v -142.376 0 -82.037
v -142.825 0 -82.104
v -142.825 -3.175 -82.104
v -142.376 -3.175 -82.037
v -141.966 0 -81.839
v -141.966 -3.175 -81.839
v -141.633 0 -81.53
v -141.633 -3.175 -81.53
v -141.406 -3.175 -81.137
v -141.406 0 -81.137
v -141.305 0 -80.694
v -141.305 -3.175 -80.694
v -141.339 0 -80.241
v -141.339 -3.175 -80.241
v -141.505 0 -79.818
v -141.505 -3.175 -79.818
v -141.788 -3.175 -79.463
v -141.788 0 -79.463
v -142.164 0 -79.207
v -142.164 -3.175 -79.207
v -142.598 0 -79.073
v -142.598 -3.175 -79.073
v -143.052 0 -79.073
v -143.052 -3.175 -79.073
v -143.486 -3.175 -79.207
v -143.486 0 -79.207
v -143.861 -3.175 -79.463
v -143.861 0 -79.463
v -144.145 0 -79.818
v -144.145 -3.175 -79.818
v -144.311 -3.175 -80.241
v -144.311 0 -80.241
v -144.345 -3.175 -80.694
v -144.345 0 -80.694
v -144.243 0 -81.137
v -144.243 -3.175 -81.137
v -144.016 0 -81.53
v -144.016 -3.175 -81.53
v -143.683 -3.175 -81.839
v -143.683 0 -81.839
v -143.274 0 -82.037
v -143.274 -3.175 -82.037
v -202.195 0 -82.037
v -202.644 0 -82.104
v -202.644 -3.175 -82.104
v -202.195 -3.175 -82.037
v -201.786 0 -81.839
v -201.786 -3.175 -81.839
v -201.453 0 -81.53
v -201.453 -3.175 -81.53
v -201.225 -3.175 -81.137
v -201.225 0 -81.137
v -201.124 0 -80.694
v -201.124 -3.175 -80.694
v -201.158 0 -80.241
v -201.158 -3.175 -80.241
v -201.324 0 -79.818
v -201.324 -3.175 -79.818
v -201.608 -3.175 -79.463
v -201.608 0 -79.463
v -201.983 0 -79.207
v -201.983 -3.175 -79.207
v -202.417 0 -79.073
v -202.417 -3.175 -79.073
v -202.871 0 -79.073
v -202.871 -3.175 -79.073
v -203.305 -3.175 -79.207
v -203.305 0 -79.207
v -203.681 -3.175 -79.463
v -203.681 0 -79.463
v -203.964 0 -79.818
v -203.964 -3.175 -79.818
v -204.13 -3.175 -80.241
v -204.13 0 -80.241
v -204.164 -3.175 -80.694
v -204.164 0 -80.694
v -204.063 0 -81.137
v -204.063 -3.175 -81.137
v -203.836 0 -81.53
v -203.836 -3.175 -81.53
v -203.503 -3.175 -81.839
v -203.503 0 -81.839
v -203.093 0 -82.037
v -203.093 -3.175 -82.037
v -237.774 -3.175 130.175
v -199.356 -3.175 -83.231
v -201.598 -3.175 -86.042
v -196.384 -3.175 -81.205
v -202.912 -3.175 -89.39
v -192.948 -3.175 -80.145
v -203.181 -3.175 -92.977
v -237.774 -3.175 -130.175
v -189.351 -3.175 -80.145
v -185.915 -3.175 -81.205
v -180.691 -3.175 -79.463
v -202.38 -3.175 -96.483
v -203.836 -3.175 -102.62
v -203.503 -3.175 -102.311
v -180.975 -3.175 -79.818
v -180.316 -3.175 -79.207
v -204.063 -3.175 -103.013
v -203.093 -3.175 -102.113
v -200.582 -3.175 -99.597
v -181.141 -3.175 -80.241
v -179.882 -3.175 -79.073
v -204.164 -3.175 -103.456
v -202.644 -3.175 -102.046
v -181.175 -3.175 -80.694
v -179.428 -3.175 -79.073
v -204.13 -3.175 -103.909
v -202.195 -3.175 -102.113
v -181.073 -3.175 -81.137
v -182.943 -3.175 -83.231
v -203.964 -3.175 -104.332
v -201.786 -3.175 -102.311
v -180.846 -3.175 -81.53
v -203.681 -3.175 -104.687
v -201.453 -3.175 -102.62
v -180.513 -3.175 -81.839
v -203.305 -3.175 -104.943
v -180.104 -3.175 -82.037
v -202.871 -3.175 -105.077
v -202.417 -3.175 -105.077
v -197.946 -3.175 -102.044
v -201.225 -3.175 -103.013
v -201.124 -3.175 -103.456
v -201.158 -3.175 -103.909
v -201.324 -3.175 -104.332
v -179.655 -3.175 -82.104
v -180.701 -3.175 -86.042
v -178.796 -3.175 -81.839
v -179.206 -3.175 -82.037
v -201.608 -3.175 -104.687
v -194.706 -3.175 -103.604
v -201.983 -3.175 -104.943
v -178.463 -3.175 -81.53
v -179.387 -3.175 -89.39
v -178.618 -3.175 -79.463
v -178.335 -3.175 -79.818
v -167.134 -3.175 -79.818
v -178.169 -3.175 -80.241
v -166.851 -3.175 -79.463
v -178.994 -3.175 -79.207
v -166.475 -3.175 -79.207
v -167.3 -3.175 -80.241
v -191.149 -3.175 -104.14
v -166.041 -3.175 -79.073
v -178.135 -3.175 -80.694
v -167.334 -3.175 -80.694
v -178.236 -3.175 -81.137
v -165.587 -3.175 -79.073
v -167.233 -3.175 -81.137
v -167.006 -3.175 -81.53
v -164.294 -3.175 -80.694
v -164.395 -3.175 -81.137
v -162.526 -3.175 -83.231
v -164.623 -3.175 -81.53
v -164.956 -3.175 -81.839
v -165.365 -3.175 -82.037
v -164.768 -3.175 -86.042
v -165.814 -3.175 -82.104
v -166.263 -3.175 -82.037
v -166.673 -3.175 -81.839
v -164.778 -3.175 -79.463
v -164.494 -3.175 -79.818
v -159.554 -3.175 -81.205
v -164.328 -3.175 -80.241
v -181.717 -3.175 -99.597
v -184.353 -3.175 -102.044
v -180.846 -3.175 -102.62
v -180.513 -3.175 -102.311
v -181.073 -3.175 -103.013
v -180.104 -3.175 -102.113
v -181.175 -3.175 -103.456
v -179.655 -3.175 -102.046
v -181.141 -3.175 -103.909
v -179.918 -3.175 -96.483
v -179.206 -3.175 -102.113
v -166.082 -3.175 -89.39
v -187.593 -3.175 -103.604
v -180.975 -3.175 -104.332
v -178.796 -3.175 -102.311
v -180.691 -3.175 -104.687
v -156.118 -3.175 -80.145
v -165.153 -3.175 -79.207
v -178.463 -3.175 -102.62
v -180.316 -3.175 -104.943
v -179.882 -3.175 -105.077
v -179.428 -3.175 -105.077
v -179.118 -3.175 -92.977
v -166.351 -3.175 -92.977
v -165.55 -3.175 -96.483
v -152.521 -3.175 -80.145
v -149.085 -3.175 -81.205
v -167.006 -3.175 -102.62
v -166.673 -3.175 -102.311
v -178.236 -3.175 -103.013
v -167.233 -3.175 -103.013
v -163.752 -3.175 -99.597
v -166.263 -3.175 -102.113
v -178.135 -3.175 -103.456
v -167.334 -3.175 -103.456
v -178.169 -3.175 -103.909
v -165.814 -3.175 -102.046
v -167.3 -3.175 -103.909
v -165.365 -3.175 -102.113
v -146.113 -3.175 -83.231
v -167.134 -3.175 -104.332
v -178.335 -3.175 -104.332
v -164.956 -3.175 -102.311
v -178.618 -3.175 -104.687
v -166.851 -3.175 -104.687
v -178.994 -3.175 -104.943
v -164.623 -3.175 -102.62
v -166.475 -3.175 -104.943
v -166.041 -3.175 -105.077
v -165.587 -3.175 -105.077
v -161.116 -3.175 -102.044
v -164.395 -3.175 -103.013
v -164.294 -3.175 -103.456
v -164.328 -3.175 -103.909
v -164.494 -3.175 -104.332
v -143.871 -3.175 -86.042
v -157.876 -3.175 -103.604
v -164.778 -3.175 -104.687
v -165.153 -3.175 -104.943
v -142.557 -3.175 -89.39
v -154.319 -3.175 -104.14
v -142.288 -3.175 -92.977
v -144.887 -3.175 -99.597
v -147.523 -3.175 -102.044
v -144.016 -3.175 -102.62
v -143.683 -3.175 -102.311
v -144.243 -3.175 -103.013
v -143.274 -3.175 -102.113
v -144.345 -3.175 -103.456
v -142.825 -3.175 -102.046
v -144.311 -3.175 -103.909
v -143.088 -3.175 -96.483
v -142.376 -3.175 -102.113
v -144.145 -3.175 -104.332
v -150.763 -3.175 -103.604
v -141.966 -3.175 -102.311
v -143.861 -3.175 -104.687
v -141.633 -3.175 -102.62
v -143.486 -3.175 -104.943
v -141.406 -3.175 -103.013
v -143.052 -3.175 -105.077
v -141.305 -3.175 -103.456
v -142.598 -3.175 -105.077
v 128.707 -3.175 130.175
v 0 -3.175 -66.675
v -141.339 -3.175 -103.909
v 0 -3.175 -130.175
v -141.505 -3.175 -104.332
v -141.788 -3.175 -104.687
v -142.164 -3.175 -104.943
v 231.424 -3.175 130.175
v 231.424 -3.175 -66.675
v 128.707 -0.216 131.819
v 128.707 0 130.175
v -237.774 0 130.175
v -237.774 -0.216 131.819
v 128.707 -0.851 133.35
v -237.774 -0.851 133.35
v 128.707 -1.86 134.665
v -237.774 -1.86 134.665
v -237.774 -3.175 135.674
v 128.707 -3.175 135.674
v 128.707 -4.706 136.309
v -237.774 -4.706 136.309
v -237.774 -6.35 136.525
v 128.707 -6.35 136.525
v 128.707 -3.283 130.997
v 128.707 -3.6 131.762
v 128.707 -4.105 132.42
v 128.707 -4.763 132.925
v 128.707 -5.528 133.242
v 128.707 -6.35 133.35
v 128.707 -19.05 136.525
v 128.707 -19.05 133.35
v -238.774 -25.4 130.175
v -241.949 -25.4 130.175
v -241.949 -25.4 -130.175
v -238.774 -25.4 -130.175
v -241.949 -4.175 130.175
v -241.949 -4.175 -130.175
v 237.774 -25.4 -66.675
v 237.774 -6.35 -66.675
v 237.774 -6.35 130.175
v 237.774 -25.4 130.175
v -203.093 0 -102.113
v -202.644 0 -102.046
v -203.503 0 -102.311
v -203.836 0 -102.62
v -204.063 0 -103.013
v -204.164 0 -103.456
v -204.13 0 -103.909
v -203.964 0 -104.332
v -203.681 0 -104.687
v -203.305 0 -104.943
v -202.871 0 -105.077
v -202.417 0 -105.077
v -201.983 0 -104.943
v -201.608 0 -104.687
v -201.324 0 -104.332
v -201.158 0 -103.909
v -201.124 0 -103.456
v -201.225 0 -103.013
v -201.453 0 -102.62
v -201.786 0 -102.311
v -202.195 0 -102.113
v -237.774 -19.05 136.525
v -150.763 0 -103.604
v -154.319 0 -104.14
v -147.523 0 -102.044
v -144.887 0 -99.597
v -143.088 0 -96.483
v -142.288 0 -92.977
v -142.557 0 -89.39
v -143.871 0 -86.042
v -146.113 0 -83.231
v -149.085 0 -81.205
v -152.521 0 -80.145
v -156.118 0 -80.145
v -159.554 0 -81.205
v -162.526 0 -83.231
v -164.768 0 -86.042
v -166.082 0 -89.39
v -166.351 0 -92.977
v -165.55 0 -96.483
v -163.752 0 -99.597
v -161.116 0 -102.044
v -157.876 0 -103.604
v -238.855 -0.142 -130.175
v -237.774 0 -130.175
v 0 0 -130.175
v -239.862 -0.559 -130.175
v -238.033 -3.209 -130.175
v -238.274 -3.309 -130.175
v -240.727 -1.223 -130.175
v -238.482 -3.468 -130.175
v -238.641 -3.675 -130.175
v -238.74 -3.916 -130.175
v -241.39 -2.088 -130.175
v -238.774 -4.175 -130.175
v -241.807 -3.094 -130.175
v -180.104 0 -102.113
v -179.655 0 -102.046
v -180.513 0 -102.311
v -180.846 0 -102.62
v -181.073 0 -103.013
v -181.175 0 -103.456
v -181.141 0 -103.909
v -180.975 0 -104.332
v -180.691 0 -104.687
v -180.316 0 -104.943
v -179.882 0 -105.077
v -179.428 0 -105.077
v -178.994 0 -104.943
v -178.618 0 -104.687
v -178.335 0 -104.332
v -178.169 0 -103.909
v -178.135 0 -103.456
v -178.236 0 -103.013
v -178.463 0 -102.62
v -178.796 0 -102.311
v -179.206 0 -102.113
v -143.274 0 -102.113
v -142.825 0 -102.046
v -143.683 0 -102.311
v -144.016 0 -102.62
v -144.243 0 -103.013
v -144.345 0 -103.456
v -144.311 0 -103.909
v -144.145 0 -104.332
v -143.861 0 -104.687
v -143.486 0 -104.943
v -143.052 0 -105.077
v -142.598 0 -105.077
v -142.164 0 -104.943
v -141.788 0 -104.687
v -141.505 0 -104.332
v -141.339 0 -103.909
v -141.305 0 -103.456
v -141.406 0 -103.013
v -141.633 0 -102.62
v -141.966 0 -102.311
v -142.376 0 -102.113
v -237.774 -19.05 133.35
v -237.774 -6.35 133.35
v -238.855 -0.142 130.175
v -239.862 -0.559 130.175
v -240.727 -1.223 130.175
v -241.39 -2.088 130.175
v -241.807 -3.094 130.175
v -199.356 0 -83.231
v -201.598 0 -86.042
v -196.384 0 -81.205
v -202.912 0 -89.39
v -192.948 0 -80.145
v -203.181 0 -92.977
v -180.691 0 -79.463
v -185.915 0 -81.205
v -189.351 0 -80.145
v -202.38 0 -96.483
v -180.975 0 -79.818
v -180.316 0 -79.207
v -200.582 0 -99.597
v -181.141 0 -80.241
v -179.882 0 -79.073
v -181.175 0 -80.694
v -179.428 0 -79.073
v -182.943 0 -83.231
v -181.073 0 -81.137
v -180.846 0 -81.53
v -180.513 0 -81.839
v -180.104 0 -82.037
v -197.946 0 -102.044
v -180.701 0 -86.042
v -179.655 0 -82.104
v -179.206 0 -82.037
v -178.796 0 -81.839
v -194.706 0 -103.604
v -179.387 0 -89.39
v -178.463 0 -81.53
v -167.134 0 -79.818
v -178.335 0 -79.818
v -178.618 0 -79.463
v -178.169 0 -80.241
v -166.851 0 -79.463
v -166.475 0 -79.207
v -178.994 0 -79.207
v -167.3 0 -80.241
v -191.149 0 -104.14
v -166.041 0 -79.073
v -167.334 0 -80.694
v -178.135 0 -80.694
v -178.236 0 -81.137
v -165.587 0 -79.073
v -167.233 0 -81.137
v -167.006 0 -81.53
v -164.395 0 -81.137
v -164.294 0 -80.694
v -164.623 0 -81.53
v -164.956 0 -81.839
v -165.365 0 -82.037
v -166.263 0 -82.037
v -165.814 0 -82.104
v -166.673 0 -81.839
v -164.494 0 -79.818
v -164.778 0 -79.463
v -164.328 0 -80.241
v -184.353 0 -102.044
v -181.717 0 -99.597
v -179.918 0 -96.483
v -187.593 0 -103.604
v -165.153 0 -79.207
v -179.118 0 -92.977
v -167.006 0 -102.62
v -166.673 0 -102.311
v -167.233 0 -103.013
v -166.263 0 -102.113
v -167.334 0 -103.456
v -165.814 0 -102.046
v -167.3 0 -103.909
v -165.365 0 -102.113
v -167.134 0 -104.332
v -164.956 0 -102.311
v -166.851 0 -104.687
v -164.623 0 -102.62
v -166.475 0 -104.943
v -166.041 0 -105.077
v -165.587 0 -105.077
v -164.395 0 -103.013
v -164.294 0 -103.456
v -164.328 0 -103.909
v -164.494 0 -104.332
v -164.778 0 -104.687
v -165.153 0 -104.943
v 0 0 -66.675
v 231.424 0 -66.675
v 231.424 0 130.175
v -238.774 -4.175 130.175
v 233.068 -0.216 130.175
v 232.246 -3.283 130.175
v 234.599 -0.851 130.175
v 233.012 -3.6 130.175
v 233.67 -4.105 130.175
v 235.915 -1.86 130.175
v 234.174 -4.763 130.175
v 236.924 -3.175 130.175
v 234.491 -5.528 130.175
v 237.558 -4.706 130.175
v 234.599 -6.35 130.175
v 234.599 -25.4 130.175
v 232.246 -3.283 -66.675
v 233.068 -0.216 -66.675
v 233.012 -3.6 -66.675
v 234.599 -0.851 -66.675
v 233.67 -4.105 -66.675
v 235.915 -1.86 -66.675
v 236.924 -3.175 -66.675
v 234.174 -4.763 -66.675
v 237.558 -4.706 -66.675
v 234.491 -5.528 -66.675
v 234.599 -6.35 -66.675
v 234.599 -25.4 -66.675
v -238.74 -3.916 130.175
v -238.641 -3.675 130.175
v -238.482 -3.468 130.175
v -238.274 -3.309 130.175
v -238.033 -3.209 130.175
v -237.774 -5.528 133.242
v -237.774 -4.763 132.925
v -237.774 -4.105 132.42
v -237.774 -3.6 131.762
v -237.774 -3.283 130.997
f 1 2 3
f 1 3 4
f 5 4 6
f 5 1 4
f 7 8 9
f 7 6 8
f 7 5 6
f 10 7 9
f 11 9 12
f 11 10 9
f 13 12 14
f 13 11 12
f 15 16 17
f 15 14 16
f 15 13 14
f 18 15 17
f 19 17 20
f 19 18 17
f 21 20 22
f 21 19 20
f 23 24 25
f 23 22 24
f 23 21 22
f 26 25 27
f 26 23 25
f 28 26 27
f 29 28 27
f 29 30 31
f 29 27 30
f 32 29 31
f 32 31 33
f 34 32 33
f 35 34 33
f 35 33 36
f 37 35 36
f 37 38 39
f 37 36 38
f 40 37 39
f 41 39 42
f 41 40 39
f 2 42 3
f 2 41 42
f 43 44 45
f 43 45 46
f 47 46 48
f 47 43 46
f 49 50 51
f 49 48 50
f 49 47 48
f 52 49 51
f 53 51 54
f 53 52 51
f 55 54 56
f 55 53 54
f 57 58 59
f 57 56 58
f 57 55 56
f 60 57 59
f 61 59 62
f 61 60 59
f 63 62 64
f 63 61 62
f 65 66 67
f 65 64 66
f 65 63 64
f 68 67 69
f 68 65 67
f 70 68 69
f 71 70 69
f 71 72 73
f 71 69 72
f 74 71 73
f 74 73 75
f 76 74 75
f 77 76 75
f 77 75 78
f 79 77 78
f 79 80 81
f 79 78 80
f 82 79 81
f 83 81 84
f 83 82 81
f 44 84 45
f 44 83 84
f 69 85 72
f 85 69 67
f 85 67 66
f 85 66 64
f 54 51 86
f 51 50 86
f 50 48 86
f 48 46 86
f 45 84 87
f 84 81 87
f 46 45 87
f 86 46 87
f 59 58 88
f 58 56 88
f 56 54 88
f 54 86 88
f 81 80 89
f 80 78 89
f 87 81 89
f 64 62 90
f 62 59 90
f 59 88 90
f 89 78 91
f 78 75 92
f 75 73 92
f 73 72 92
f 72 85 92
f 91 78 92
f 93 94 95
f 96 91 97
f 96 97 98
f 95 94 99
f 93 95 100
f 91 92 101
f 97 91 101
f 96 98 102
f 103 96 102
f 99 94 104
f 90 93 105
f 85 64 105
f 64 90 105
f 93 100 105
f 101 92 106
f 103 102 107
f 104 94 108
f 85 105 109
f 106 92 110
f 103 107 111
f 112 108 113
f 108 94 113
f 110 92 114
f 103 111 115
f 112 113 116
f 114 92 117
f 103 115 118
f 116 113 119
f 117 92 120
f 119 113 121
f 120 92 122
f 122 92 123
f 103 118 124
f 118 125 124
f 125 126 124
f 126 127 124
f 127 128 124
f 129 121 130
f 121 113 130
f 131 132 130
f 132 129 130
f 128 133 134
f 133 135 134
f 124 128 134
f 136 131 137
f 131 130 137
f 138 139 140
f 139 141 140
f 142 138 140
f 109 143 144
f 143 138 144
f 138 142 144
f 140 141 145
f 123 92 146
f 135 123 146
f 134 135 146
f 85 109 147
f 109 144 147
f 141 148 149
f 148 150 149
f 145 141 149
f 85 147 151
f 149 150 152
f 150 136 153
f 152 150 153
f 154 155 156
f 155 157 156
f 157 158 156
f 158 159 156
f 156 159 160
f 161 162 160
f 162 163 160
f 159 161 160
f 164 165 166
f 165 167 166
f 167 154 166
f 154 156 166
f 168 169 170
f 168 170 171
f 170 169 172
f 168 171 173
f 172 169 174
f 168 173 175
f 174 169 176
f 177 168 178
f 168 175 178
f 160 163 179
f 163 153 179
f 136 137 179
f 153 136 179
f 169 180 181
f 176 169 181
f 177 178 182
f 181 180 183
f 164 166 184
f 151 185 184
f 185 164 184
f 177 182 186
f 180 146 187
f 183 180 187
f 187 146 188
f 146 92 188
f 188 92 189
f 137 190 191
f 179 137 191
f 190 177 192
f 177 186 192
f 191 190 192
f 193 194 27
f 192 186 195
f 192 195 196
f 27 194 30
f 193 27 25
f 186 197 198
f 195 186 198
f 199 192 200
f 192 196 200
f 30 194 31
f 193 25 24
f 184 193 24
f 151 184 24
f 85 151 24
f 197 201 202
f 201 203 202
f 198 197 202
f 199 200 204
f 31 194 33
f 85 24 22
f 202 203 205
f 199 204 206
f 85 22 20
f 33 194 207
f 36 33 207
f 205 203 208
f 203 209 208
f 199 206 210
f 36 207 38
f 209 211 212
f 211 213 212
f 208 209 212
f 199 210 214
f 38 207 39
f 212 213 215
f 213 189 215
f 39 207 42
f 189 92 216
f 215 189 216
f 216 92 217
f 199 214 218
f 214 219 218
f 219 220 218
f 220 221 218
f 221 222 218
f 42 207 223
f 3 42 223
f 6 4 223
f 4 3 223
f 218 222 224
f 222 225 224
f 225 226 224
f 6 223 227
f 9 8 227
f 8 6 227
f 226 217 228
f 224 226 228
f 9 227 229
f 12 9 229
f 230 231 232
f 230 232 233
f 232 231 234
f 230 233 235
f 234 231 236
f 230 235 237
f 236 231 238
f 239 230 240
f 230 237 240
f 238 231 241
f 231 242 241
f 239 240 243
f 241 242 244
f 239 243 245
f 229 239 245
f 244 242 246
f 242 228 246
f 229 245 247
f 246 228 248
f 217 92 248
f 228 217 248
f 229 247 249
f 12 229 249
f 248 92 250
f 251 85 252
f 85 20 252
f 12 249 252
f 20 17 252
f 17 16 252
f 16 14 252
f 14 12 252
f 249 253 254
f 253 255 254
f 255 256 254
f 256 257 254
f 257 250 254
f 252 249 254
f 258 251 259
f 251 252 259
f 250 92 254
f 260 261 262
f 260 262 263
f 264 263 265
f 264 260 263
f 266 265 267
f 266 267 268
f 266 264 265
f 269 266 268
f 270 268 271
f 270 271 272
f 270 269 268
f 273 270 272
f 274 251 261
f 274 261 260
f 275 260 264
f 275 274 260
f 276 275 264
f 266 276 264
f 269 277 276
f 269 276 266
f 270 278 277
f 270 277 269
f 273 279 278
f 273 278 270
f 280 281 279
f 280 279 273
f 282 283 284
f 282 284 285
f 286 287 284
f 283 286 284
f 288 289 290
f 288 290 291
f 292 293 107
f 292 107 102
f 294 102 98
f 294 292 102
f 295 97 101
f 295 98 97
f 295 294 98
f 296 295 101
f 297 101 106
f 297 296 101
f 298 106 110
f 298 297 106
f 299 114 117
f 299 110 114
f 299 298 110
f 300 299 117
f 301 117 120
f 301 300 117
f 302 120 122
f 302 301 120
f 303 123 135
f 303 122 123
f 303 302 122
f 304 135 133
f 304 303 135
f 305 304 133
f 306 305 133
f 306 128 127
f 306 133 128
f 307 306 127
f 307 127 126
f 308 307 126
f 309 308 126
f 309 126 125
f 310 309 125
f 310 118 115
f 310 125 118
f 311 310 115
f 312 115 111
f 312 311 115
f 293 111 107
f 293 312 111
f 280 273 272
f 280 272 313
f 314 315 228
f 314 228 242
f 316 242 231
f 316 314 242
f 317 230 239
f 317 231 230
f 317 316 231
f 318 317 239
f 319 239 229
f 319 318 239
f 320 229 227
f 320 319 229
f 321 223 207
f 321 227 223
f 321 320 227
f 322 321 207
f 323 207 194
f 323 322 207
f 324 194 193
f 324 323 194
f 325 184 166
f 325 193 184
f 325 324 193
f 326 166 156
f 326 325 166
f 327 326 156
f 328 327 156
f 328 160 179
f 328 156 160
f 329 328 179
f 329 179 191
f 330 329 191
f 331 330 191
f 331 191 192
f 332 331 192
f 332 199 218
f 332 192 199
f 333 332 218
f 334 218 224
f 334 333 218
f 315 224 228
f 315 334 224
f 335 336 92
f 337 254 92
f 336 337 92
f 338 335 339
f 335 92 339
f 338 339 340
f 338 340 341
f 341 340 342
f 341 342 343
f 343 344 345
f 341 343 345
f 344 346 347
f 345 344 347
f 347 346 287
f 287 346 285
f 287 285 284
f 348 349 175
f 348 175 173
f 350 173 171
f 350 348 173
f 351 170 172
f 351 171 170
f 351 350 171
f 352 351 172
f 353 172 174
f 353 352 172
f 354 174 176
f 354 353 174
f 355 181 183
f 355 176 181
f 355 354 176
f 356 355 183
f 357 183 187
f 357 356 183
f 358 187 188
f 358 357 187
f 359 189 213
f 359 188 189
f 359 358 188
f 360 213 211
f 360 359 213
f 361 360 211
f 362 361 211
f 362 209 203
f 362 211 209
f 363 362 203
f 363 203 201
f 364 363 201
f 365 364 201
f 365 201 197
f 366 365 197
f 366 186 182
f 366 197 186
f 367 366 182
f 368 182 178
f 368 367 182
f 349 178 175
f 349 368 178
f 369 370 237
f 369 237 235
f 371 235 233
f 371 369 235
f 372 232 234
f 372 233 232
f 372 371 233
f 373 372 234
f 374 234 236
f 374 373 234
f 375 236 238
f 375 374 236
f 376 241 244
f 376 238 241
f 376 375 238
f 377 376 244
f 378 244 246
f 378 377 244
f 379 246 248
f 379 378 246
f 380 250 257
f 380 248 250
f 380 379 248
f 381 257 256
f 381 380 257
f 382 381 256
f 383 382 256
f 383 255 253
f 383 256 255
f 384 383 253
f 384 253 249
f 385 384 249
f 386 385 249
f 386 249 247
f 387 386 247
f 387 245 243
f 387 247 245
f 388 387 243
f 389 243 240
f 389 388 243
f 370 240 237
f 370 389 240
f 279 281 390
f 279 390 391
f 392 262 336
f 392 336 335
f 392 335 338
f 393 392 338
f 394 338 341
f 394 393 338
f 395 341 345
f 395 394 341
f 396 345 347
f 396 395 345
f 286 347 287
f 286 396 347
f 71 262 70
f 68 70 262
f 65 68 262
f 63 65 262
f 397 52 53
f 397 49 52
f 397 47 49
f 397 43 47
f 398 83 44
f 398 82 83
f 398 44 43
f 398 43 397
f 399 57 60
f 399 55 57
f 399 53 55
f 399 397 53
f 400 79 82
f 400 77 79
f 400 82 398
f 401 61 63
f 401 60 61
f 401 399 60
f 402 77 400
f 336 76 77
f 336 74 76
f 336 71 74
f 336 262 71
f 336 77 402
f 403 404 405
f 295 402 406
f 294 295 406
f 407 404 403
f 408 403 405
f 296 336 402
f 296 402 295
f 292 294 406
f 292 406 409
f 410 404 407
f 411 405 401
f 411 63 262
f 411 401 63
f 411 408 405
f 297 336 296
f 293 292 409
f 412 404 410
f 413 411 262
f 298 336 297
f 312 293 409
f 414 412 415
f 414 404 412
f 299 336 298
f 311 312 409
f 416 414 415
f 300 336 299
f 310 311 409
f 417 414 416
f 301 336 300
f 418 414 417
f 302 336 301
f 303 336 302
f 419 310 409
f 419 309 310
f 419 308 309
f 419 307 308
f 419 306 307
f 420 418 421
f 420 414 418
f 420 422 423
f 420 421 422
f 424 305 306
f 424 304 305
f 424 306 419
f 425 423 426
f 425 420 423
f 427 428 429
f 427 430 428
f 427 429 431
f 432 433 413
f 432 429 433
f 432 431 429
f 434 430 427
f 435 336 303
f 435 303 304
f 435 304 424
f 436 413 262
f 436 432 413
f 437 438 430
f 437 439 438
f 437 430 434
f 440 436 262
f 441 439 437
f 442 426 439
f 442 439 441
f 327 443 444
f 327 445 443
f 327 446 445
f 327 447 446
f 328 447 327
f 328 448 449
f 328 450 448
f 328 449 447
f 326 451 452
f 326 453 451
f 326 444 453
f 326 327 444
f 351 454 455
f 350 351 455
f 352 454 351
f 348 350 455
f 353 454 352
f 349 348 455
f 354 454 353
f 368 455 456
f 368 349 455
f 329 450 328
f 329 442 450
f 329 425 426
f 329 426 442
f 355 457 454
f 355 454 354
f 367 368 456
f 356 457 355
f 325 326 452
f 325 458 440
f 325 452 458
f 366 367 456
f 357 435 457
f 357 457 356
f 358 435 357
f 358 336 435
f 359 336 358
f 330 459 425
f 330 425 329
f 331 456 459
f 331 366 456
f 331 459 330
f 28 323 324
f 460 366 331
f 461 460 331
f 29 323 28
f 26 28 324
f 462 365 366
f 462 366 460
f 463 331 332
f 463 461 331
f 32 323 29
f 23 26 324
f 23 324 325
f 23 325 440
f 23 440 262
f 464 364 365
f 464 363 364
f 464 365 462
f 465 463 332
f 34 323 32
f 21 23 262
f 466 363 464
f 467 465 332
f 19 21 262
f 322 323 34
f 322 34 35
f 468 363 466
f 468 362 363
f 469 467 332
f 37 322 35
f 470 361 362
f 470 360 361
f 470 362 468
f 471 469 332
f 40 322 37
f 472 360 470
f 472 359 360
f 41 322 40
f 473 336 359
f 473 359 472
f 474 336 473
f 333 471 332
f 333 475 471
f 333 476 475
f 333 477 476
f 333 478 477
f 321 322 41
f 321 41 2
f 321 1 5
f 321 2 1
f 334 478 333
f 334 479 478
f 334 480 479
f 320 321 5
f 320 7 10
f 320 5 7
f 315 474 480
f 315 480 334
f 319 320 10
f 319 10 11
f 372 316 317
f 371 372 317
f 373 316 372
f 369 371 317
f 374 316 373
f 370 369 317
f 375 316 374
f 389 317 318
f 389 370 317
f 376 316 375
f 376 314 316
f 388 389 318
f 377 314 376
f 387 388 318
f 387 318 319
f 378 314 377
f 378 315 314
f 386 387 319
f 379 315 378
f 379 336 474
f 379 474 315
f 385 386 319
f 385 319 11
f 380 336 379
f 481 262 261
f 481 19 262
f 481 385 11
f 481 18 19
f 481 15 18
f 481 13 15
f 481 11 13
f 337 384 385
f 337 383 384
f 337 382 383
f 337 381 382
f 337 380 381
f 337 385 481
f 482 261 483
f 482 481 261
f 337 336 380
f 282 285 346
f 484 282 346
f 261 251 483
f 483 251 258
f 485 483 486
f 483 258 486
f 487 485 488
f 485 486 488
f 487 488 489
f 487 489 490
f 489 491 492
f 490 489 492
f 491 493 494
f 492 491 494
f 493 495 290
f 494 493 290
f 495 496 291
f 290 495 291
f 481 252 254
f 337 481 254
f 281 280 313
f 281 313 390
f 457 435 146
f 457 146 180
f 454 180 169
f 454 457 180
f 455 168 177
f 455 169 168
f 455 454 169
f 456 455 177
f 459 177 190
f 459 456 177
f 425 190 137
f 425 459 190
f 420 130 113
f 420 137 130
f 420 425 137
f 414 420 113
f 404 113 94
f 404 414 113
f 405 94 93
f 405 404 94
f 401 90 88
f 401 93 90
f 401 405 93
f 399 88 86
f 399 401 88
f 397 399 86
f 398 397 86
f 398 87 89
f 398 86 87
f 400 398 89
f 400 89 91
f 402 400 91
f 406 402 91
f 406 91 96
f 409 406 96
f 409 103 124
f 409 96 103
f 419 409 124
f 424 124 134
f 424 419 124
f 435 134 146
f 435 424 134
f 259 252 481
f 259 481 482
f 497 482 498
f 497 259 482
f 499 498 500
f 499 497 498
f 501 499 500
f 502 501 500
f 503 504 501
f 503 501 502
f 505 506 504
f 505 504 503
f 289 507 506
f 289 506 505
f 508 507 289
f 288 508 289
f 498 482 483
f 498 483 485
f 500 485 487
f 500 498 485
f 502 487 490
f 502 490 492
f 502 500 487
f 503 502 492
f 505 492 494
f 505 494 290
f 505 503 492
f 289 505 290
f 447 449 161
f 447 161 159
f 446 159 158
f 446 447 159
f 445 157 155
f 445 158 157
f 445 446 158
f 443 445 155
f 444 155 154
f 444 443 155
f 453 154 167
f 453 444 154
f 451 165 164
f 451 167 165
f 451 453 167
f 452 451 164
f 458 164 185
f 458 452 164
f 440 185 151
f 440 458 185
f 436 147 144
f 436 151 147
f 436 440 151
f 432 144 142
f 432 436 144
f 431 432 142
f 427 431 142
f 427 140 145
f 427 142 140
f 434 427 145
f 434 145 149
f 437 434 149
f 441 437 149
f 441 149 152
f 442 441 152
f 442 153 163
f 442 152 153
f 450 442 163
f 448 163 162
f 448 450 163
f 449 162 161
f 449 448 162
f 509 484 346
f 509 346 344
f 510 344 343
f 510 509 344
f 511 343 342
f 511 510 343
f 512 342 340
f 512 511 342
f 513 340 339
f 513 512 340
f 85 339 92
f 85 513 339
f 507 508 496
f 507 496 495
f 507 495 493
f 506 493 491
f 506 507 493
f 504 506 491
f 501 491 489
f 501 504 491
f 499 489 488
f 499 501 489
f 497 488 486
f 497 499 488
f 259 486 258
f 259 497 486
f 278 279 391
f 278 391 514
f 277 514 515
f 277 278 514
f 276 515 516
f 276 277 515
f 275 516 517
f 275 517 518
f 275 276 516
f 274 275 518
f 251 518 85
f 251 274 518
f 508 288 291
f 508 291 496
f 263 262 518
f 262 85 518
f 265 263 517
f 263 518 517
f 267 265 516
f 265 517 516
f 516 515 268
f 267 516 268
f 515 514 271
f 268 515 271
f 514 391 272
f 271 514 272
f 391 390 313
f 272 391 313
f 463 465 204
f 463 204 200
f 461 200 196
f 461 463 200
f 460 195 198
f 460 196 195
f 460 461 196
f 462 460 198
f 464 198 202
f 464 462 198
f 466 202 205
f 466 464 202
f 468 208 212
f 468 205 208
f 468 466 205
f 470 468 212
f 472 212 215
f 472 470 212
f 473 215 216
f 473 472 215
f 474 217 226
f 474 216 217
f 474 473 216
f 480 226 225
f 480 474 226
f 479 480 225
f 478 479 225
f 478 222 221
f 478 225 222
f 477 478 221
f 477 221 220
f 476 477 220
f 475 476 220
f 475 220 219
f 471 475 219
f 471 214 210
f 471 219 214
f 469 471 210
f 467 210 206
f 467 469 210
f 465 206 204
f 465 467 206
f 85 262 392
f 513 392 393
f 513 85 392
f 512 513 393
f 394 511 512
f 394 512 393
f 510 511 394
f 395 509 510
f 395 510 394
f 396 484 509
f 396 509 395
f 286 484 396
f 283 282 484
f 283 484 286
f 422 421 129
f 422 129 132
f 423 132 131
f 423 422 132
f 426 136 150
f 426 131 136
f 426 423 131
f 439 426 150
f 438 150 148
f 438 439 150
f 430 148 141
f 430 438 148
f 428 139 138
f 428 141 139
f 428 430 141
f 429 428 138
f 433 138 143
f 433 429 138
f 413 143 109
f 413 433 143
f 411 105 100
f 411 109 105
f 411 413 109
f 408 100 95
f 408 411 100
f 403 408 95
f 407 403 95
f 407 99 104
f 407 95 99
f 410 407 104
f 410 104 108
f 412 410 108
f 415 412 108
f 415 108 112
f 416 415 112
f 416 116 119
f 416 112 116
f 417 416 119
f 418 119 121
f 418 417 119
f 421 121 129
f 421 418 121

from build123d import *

# Parameters (mm, degrees)
SKETCH5_W                    = 475.54896
SKETCH5_H                    = 260.35
BASE_FLANGE1_DEPTH           = 3.175
EDGE_FLANGE1_DEPTH           = 366.48136
EDGE_FLANGE2_STRIP_W         = 19.05
EDGE_FLANGE2_STRIP_H         = 3.175
EDGE_FLANGE2_STRIP_CUT_DEPTH = 260.35
EDGE_FLANGE2_DEPTH           = 260.35
EDGE_FLANGE3_DEPTH           = 260.35
CUT_EXTRUDE1_DEPTH           = 279.969149723
CUT_EXTRUDE1_DEPTH_BACK      = 279.969149723
SKETCH15_W                   = 329.647515686
SKETCH15_H                   = 175.541944057
CUT_EXTRUDE2_DEPTH           = 279.698003441
CUT_EXTRUDE2_DEPTH_BACK      = 279.698003441
SKETCH16_R                   = 12.065
SKETCH16_R_2                 = 1.524


# Sheet-metal steps are written as plain solids
with BuildPart() as part:
    # Sketch5 → Base-Flange1 (new body)
    with BuildSketch(Plane(origin=(0, 0, 0), x_dir=(1, 0, 0), z_dir=(0, 1, 0))):
        Rectangle(SKETCH5_W, SKETCH5_H)
    extrude(amount=-BASE_FLANGE1_DEPTH)

    # Edge-Flange1 section (across the edge) → Edge-Flange1 (add)
    with BuildSketch(Plane(origin=(128.70688, -3.175, 133.35), x_dir=(0, 0, -1), z_dir=(-1, 0, 0))):
        with BuildLine():
            Line((-3.175, 3.175), (-3.175, 15.875))
            Line((-3.175, 15.875), (0, 15.875))
            Line((0, 15.875), (0, 3.175))
            ThreePointArc((0, 3.175), (0.92993597, 0.92993597), (3.175, 0))
            Line((3.175, 0), (3.175, -3.175))
            ThreePointArc((3.175, -3.175), (-1.315128061, -1.315128061), (-3.175, 3.175))
        make_face()
    extrude(amount=EDGE_FLANGE1_DEPTH)

    # Edge-Flange2 strip (across the edge) → Edge-Flange2 strip cut (cut)
    with BuildSketch(Plane(origin=(237.77448, -3.175, -130.175), x_dir=(-1, 0, 0), z_dir=(0, 0, 1))):
        with Locations((-3.175, -1.5875)):
            Rectangle(EDGE_FLANGE2_STRIP_W, EDGE_FLANGE2_STRIP_H)
    extrude(amount=EDGE_FLANGE2_STRIP_CUT_DEPTH, mode=Mode.SUBTRACT)

    # Edge-Flange2 section (across the edge) → Edge-Flange2 (add)
    with BuildSketch(Plane(origin=(237.77448, -3.175, -130.175), x_dir=(-1, 0, 0), z_dir=(0, 0, 1))):
        with BuildLine():
            Line((0, 3.175), (0, 22.225))
            Line((0, 22.225), (3.175, 22.225))
            Line((3.175, 22.225), (3.175, 3.175))
            ThreePointArc((3.175, 3.175), (4.10493597, 0.92993597), (6.35, 0))
            Line((6.35, 0), (6.35, -3.175))
            ThreePointArc((6.35, -3.175), (1.859871939, -1.315128061), (0, 3.175))
        make_face()
    extrude(amount=EDGE_FLANGE2_DEPTH)

    # Edge-Flange3 section (across the edge) → Edge-Flange3 (add)
    with BuildSketch(Plane(origin=(-238.77448, -3.175, 130.175), x_dir=(1, 0, 0), z_dir=(0, 0, -1))):
        with BuildLine():
            Line((-3.175, 1), (-3.175, 22.225))
            Line((-3.175, 22.225), (0, 22.225))
            Line((0, 22.225), (0, 1))
            ThreePointArc((0, 1), (0.292893219, 0.292893219), (1, 0))
            Line((1, 0), (1, -3.175))
            ThreePointArc((1, -3.175), (-1.952170811, -1.952170811), (-3.175, 1))
        make_face()
    extrude(amount=EDGE_FLANGE3_DEPTH)

    # Sketch15 → Cut-Extrude1 (cut, two sides: drawn at the far end of the back side and taken through both)
    with BuildSketch(Plane(origin=(0, 0, 0), x_dir=(1, 0, 0), z_dir=(0, 1, 0)).offset(-CUT_EXTRUDE1_DEPTH_BACK)):
        with Locations((164.823757843, 154.445972028)):
            Rectangle(SKETCH15_W, SKETCH15_H)
    extrude(amount=CUT_EXTRUDE1_DEPTH + CUT_EXTRUDE1_DEPTH_BACK, mode=Mode.SUBTRACT)

    # Sketch16 → Cut-Extrude2 (cut, two sides: drawn at the far end of the back side and taken through both)
    with BuildSketch(Plane.XZ.offset(3.175).offset(-CUT_EXTRUDE2_DEPTH_BACK)):
        with Locations(Location((-191.14948, -92.075, 0), (0, 0, 270))):
            Circle(SKETCH16_R)
        with Locations(Location((-179.654811625, -80.580212705, 0), (0, 0, 270))):
            Circle(SKETCH16_R_2)
        with Locations(Location((-202.644148375, -80.580212705, 0), (0, 0, 270))):
            Circle(SKETCH16_R_2)
        with Locations(Location((-179.654811625, -103.569787295, 0), (0, 0, 90))):
            Circle(SKETCH16_R_2)
        with Locations(Location((-202.644148375, -103.569787295, 0), (0, 0, 90))):
            Circle(SKETCH16_R_2)
        with Locations(Location((-165.814148375, -80.580212705, 0), (0, 0, 270))):
            Circle(SKETCH16_R_2)
        with Locations(Location((-154.31948, -92.075, 0), (0, 0, 270))):
            Circle(SKETCH16_R)
        with Locations(Location((-142.824811625, -80.580212705, 0), (0, 0, 270))):
            Circle(SKETCH16_R_2)
        with Locations(Location((-165.814148375, -103.569787295, 0), (0, 0, 90))):
            Circle(SKETCH16_R_2)
        with Locations(Location((-142.824811625, -103.569787295, 0), (0, 0, 90))):
            Circle(SKETCH16_R_2)
    extrude(amount=CUT_EXTRUDE2_DEPTH + CUT_EXTRUDE2_DEPTH_BACK, mode=Mode.SUBTRACT)


solid = part.part
